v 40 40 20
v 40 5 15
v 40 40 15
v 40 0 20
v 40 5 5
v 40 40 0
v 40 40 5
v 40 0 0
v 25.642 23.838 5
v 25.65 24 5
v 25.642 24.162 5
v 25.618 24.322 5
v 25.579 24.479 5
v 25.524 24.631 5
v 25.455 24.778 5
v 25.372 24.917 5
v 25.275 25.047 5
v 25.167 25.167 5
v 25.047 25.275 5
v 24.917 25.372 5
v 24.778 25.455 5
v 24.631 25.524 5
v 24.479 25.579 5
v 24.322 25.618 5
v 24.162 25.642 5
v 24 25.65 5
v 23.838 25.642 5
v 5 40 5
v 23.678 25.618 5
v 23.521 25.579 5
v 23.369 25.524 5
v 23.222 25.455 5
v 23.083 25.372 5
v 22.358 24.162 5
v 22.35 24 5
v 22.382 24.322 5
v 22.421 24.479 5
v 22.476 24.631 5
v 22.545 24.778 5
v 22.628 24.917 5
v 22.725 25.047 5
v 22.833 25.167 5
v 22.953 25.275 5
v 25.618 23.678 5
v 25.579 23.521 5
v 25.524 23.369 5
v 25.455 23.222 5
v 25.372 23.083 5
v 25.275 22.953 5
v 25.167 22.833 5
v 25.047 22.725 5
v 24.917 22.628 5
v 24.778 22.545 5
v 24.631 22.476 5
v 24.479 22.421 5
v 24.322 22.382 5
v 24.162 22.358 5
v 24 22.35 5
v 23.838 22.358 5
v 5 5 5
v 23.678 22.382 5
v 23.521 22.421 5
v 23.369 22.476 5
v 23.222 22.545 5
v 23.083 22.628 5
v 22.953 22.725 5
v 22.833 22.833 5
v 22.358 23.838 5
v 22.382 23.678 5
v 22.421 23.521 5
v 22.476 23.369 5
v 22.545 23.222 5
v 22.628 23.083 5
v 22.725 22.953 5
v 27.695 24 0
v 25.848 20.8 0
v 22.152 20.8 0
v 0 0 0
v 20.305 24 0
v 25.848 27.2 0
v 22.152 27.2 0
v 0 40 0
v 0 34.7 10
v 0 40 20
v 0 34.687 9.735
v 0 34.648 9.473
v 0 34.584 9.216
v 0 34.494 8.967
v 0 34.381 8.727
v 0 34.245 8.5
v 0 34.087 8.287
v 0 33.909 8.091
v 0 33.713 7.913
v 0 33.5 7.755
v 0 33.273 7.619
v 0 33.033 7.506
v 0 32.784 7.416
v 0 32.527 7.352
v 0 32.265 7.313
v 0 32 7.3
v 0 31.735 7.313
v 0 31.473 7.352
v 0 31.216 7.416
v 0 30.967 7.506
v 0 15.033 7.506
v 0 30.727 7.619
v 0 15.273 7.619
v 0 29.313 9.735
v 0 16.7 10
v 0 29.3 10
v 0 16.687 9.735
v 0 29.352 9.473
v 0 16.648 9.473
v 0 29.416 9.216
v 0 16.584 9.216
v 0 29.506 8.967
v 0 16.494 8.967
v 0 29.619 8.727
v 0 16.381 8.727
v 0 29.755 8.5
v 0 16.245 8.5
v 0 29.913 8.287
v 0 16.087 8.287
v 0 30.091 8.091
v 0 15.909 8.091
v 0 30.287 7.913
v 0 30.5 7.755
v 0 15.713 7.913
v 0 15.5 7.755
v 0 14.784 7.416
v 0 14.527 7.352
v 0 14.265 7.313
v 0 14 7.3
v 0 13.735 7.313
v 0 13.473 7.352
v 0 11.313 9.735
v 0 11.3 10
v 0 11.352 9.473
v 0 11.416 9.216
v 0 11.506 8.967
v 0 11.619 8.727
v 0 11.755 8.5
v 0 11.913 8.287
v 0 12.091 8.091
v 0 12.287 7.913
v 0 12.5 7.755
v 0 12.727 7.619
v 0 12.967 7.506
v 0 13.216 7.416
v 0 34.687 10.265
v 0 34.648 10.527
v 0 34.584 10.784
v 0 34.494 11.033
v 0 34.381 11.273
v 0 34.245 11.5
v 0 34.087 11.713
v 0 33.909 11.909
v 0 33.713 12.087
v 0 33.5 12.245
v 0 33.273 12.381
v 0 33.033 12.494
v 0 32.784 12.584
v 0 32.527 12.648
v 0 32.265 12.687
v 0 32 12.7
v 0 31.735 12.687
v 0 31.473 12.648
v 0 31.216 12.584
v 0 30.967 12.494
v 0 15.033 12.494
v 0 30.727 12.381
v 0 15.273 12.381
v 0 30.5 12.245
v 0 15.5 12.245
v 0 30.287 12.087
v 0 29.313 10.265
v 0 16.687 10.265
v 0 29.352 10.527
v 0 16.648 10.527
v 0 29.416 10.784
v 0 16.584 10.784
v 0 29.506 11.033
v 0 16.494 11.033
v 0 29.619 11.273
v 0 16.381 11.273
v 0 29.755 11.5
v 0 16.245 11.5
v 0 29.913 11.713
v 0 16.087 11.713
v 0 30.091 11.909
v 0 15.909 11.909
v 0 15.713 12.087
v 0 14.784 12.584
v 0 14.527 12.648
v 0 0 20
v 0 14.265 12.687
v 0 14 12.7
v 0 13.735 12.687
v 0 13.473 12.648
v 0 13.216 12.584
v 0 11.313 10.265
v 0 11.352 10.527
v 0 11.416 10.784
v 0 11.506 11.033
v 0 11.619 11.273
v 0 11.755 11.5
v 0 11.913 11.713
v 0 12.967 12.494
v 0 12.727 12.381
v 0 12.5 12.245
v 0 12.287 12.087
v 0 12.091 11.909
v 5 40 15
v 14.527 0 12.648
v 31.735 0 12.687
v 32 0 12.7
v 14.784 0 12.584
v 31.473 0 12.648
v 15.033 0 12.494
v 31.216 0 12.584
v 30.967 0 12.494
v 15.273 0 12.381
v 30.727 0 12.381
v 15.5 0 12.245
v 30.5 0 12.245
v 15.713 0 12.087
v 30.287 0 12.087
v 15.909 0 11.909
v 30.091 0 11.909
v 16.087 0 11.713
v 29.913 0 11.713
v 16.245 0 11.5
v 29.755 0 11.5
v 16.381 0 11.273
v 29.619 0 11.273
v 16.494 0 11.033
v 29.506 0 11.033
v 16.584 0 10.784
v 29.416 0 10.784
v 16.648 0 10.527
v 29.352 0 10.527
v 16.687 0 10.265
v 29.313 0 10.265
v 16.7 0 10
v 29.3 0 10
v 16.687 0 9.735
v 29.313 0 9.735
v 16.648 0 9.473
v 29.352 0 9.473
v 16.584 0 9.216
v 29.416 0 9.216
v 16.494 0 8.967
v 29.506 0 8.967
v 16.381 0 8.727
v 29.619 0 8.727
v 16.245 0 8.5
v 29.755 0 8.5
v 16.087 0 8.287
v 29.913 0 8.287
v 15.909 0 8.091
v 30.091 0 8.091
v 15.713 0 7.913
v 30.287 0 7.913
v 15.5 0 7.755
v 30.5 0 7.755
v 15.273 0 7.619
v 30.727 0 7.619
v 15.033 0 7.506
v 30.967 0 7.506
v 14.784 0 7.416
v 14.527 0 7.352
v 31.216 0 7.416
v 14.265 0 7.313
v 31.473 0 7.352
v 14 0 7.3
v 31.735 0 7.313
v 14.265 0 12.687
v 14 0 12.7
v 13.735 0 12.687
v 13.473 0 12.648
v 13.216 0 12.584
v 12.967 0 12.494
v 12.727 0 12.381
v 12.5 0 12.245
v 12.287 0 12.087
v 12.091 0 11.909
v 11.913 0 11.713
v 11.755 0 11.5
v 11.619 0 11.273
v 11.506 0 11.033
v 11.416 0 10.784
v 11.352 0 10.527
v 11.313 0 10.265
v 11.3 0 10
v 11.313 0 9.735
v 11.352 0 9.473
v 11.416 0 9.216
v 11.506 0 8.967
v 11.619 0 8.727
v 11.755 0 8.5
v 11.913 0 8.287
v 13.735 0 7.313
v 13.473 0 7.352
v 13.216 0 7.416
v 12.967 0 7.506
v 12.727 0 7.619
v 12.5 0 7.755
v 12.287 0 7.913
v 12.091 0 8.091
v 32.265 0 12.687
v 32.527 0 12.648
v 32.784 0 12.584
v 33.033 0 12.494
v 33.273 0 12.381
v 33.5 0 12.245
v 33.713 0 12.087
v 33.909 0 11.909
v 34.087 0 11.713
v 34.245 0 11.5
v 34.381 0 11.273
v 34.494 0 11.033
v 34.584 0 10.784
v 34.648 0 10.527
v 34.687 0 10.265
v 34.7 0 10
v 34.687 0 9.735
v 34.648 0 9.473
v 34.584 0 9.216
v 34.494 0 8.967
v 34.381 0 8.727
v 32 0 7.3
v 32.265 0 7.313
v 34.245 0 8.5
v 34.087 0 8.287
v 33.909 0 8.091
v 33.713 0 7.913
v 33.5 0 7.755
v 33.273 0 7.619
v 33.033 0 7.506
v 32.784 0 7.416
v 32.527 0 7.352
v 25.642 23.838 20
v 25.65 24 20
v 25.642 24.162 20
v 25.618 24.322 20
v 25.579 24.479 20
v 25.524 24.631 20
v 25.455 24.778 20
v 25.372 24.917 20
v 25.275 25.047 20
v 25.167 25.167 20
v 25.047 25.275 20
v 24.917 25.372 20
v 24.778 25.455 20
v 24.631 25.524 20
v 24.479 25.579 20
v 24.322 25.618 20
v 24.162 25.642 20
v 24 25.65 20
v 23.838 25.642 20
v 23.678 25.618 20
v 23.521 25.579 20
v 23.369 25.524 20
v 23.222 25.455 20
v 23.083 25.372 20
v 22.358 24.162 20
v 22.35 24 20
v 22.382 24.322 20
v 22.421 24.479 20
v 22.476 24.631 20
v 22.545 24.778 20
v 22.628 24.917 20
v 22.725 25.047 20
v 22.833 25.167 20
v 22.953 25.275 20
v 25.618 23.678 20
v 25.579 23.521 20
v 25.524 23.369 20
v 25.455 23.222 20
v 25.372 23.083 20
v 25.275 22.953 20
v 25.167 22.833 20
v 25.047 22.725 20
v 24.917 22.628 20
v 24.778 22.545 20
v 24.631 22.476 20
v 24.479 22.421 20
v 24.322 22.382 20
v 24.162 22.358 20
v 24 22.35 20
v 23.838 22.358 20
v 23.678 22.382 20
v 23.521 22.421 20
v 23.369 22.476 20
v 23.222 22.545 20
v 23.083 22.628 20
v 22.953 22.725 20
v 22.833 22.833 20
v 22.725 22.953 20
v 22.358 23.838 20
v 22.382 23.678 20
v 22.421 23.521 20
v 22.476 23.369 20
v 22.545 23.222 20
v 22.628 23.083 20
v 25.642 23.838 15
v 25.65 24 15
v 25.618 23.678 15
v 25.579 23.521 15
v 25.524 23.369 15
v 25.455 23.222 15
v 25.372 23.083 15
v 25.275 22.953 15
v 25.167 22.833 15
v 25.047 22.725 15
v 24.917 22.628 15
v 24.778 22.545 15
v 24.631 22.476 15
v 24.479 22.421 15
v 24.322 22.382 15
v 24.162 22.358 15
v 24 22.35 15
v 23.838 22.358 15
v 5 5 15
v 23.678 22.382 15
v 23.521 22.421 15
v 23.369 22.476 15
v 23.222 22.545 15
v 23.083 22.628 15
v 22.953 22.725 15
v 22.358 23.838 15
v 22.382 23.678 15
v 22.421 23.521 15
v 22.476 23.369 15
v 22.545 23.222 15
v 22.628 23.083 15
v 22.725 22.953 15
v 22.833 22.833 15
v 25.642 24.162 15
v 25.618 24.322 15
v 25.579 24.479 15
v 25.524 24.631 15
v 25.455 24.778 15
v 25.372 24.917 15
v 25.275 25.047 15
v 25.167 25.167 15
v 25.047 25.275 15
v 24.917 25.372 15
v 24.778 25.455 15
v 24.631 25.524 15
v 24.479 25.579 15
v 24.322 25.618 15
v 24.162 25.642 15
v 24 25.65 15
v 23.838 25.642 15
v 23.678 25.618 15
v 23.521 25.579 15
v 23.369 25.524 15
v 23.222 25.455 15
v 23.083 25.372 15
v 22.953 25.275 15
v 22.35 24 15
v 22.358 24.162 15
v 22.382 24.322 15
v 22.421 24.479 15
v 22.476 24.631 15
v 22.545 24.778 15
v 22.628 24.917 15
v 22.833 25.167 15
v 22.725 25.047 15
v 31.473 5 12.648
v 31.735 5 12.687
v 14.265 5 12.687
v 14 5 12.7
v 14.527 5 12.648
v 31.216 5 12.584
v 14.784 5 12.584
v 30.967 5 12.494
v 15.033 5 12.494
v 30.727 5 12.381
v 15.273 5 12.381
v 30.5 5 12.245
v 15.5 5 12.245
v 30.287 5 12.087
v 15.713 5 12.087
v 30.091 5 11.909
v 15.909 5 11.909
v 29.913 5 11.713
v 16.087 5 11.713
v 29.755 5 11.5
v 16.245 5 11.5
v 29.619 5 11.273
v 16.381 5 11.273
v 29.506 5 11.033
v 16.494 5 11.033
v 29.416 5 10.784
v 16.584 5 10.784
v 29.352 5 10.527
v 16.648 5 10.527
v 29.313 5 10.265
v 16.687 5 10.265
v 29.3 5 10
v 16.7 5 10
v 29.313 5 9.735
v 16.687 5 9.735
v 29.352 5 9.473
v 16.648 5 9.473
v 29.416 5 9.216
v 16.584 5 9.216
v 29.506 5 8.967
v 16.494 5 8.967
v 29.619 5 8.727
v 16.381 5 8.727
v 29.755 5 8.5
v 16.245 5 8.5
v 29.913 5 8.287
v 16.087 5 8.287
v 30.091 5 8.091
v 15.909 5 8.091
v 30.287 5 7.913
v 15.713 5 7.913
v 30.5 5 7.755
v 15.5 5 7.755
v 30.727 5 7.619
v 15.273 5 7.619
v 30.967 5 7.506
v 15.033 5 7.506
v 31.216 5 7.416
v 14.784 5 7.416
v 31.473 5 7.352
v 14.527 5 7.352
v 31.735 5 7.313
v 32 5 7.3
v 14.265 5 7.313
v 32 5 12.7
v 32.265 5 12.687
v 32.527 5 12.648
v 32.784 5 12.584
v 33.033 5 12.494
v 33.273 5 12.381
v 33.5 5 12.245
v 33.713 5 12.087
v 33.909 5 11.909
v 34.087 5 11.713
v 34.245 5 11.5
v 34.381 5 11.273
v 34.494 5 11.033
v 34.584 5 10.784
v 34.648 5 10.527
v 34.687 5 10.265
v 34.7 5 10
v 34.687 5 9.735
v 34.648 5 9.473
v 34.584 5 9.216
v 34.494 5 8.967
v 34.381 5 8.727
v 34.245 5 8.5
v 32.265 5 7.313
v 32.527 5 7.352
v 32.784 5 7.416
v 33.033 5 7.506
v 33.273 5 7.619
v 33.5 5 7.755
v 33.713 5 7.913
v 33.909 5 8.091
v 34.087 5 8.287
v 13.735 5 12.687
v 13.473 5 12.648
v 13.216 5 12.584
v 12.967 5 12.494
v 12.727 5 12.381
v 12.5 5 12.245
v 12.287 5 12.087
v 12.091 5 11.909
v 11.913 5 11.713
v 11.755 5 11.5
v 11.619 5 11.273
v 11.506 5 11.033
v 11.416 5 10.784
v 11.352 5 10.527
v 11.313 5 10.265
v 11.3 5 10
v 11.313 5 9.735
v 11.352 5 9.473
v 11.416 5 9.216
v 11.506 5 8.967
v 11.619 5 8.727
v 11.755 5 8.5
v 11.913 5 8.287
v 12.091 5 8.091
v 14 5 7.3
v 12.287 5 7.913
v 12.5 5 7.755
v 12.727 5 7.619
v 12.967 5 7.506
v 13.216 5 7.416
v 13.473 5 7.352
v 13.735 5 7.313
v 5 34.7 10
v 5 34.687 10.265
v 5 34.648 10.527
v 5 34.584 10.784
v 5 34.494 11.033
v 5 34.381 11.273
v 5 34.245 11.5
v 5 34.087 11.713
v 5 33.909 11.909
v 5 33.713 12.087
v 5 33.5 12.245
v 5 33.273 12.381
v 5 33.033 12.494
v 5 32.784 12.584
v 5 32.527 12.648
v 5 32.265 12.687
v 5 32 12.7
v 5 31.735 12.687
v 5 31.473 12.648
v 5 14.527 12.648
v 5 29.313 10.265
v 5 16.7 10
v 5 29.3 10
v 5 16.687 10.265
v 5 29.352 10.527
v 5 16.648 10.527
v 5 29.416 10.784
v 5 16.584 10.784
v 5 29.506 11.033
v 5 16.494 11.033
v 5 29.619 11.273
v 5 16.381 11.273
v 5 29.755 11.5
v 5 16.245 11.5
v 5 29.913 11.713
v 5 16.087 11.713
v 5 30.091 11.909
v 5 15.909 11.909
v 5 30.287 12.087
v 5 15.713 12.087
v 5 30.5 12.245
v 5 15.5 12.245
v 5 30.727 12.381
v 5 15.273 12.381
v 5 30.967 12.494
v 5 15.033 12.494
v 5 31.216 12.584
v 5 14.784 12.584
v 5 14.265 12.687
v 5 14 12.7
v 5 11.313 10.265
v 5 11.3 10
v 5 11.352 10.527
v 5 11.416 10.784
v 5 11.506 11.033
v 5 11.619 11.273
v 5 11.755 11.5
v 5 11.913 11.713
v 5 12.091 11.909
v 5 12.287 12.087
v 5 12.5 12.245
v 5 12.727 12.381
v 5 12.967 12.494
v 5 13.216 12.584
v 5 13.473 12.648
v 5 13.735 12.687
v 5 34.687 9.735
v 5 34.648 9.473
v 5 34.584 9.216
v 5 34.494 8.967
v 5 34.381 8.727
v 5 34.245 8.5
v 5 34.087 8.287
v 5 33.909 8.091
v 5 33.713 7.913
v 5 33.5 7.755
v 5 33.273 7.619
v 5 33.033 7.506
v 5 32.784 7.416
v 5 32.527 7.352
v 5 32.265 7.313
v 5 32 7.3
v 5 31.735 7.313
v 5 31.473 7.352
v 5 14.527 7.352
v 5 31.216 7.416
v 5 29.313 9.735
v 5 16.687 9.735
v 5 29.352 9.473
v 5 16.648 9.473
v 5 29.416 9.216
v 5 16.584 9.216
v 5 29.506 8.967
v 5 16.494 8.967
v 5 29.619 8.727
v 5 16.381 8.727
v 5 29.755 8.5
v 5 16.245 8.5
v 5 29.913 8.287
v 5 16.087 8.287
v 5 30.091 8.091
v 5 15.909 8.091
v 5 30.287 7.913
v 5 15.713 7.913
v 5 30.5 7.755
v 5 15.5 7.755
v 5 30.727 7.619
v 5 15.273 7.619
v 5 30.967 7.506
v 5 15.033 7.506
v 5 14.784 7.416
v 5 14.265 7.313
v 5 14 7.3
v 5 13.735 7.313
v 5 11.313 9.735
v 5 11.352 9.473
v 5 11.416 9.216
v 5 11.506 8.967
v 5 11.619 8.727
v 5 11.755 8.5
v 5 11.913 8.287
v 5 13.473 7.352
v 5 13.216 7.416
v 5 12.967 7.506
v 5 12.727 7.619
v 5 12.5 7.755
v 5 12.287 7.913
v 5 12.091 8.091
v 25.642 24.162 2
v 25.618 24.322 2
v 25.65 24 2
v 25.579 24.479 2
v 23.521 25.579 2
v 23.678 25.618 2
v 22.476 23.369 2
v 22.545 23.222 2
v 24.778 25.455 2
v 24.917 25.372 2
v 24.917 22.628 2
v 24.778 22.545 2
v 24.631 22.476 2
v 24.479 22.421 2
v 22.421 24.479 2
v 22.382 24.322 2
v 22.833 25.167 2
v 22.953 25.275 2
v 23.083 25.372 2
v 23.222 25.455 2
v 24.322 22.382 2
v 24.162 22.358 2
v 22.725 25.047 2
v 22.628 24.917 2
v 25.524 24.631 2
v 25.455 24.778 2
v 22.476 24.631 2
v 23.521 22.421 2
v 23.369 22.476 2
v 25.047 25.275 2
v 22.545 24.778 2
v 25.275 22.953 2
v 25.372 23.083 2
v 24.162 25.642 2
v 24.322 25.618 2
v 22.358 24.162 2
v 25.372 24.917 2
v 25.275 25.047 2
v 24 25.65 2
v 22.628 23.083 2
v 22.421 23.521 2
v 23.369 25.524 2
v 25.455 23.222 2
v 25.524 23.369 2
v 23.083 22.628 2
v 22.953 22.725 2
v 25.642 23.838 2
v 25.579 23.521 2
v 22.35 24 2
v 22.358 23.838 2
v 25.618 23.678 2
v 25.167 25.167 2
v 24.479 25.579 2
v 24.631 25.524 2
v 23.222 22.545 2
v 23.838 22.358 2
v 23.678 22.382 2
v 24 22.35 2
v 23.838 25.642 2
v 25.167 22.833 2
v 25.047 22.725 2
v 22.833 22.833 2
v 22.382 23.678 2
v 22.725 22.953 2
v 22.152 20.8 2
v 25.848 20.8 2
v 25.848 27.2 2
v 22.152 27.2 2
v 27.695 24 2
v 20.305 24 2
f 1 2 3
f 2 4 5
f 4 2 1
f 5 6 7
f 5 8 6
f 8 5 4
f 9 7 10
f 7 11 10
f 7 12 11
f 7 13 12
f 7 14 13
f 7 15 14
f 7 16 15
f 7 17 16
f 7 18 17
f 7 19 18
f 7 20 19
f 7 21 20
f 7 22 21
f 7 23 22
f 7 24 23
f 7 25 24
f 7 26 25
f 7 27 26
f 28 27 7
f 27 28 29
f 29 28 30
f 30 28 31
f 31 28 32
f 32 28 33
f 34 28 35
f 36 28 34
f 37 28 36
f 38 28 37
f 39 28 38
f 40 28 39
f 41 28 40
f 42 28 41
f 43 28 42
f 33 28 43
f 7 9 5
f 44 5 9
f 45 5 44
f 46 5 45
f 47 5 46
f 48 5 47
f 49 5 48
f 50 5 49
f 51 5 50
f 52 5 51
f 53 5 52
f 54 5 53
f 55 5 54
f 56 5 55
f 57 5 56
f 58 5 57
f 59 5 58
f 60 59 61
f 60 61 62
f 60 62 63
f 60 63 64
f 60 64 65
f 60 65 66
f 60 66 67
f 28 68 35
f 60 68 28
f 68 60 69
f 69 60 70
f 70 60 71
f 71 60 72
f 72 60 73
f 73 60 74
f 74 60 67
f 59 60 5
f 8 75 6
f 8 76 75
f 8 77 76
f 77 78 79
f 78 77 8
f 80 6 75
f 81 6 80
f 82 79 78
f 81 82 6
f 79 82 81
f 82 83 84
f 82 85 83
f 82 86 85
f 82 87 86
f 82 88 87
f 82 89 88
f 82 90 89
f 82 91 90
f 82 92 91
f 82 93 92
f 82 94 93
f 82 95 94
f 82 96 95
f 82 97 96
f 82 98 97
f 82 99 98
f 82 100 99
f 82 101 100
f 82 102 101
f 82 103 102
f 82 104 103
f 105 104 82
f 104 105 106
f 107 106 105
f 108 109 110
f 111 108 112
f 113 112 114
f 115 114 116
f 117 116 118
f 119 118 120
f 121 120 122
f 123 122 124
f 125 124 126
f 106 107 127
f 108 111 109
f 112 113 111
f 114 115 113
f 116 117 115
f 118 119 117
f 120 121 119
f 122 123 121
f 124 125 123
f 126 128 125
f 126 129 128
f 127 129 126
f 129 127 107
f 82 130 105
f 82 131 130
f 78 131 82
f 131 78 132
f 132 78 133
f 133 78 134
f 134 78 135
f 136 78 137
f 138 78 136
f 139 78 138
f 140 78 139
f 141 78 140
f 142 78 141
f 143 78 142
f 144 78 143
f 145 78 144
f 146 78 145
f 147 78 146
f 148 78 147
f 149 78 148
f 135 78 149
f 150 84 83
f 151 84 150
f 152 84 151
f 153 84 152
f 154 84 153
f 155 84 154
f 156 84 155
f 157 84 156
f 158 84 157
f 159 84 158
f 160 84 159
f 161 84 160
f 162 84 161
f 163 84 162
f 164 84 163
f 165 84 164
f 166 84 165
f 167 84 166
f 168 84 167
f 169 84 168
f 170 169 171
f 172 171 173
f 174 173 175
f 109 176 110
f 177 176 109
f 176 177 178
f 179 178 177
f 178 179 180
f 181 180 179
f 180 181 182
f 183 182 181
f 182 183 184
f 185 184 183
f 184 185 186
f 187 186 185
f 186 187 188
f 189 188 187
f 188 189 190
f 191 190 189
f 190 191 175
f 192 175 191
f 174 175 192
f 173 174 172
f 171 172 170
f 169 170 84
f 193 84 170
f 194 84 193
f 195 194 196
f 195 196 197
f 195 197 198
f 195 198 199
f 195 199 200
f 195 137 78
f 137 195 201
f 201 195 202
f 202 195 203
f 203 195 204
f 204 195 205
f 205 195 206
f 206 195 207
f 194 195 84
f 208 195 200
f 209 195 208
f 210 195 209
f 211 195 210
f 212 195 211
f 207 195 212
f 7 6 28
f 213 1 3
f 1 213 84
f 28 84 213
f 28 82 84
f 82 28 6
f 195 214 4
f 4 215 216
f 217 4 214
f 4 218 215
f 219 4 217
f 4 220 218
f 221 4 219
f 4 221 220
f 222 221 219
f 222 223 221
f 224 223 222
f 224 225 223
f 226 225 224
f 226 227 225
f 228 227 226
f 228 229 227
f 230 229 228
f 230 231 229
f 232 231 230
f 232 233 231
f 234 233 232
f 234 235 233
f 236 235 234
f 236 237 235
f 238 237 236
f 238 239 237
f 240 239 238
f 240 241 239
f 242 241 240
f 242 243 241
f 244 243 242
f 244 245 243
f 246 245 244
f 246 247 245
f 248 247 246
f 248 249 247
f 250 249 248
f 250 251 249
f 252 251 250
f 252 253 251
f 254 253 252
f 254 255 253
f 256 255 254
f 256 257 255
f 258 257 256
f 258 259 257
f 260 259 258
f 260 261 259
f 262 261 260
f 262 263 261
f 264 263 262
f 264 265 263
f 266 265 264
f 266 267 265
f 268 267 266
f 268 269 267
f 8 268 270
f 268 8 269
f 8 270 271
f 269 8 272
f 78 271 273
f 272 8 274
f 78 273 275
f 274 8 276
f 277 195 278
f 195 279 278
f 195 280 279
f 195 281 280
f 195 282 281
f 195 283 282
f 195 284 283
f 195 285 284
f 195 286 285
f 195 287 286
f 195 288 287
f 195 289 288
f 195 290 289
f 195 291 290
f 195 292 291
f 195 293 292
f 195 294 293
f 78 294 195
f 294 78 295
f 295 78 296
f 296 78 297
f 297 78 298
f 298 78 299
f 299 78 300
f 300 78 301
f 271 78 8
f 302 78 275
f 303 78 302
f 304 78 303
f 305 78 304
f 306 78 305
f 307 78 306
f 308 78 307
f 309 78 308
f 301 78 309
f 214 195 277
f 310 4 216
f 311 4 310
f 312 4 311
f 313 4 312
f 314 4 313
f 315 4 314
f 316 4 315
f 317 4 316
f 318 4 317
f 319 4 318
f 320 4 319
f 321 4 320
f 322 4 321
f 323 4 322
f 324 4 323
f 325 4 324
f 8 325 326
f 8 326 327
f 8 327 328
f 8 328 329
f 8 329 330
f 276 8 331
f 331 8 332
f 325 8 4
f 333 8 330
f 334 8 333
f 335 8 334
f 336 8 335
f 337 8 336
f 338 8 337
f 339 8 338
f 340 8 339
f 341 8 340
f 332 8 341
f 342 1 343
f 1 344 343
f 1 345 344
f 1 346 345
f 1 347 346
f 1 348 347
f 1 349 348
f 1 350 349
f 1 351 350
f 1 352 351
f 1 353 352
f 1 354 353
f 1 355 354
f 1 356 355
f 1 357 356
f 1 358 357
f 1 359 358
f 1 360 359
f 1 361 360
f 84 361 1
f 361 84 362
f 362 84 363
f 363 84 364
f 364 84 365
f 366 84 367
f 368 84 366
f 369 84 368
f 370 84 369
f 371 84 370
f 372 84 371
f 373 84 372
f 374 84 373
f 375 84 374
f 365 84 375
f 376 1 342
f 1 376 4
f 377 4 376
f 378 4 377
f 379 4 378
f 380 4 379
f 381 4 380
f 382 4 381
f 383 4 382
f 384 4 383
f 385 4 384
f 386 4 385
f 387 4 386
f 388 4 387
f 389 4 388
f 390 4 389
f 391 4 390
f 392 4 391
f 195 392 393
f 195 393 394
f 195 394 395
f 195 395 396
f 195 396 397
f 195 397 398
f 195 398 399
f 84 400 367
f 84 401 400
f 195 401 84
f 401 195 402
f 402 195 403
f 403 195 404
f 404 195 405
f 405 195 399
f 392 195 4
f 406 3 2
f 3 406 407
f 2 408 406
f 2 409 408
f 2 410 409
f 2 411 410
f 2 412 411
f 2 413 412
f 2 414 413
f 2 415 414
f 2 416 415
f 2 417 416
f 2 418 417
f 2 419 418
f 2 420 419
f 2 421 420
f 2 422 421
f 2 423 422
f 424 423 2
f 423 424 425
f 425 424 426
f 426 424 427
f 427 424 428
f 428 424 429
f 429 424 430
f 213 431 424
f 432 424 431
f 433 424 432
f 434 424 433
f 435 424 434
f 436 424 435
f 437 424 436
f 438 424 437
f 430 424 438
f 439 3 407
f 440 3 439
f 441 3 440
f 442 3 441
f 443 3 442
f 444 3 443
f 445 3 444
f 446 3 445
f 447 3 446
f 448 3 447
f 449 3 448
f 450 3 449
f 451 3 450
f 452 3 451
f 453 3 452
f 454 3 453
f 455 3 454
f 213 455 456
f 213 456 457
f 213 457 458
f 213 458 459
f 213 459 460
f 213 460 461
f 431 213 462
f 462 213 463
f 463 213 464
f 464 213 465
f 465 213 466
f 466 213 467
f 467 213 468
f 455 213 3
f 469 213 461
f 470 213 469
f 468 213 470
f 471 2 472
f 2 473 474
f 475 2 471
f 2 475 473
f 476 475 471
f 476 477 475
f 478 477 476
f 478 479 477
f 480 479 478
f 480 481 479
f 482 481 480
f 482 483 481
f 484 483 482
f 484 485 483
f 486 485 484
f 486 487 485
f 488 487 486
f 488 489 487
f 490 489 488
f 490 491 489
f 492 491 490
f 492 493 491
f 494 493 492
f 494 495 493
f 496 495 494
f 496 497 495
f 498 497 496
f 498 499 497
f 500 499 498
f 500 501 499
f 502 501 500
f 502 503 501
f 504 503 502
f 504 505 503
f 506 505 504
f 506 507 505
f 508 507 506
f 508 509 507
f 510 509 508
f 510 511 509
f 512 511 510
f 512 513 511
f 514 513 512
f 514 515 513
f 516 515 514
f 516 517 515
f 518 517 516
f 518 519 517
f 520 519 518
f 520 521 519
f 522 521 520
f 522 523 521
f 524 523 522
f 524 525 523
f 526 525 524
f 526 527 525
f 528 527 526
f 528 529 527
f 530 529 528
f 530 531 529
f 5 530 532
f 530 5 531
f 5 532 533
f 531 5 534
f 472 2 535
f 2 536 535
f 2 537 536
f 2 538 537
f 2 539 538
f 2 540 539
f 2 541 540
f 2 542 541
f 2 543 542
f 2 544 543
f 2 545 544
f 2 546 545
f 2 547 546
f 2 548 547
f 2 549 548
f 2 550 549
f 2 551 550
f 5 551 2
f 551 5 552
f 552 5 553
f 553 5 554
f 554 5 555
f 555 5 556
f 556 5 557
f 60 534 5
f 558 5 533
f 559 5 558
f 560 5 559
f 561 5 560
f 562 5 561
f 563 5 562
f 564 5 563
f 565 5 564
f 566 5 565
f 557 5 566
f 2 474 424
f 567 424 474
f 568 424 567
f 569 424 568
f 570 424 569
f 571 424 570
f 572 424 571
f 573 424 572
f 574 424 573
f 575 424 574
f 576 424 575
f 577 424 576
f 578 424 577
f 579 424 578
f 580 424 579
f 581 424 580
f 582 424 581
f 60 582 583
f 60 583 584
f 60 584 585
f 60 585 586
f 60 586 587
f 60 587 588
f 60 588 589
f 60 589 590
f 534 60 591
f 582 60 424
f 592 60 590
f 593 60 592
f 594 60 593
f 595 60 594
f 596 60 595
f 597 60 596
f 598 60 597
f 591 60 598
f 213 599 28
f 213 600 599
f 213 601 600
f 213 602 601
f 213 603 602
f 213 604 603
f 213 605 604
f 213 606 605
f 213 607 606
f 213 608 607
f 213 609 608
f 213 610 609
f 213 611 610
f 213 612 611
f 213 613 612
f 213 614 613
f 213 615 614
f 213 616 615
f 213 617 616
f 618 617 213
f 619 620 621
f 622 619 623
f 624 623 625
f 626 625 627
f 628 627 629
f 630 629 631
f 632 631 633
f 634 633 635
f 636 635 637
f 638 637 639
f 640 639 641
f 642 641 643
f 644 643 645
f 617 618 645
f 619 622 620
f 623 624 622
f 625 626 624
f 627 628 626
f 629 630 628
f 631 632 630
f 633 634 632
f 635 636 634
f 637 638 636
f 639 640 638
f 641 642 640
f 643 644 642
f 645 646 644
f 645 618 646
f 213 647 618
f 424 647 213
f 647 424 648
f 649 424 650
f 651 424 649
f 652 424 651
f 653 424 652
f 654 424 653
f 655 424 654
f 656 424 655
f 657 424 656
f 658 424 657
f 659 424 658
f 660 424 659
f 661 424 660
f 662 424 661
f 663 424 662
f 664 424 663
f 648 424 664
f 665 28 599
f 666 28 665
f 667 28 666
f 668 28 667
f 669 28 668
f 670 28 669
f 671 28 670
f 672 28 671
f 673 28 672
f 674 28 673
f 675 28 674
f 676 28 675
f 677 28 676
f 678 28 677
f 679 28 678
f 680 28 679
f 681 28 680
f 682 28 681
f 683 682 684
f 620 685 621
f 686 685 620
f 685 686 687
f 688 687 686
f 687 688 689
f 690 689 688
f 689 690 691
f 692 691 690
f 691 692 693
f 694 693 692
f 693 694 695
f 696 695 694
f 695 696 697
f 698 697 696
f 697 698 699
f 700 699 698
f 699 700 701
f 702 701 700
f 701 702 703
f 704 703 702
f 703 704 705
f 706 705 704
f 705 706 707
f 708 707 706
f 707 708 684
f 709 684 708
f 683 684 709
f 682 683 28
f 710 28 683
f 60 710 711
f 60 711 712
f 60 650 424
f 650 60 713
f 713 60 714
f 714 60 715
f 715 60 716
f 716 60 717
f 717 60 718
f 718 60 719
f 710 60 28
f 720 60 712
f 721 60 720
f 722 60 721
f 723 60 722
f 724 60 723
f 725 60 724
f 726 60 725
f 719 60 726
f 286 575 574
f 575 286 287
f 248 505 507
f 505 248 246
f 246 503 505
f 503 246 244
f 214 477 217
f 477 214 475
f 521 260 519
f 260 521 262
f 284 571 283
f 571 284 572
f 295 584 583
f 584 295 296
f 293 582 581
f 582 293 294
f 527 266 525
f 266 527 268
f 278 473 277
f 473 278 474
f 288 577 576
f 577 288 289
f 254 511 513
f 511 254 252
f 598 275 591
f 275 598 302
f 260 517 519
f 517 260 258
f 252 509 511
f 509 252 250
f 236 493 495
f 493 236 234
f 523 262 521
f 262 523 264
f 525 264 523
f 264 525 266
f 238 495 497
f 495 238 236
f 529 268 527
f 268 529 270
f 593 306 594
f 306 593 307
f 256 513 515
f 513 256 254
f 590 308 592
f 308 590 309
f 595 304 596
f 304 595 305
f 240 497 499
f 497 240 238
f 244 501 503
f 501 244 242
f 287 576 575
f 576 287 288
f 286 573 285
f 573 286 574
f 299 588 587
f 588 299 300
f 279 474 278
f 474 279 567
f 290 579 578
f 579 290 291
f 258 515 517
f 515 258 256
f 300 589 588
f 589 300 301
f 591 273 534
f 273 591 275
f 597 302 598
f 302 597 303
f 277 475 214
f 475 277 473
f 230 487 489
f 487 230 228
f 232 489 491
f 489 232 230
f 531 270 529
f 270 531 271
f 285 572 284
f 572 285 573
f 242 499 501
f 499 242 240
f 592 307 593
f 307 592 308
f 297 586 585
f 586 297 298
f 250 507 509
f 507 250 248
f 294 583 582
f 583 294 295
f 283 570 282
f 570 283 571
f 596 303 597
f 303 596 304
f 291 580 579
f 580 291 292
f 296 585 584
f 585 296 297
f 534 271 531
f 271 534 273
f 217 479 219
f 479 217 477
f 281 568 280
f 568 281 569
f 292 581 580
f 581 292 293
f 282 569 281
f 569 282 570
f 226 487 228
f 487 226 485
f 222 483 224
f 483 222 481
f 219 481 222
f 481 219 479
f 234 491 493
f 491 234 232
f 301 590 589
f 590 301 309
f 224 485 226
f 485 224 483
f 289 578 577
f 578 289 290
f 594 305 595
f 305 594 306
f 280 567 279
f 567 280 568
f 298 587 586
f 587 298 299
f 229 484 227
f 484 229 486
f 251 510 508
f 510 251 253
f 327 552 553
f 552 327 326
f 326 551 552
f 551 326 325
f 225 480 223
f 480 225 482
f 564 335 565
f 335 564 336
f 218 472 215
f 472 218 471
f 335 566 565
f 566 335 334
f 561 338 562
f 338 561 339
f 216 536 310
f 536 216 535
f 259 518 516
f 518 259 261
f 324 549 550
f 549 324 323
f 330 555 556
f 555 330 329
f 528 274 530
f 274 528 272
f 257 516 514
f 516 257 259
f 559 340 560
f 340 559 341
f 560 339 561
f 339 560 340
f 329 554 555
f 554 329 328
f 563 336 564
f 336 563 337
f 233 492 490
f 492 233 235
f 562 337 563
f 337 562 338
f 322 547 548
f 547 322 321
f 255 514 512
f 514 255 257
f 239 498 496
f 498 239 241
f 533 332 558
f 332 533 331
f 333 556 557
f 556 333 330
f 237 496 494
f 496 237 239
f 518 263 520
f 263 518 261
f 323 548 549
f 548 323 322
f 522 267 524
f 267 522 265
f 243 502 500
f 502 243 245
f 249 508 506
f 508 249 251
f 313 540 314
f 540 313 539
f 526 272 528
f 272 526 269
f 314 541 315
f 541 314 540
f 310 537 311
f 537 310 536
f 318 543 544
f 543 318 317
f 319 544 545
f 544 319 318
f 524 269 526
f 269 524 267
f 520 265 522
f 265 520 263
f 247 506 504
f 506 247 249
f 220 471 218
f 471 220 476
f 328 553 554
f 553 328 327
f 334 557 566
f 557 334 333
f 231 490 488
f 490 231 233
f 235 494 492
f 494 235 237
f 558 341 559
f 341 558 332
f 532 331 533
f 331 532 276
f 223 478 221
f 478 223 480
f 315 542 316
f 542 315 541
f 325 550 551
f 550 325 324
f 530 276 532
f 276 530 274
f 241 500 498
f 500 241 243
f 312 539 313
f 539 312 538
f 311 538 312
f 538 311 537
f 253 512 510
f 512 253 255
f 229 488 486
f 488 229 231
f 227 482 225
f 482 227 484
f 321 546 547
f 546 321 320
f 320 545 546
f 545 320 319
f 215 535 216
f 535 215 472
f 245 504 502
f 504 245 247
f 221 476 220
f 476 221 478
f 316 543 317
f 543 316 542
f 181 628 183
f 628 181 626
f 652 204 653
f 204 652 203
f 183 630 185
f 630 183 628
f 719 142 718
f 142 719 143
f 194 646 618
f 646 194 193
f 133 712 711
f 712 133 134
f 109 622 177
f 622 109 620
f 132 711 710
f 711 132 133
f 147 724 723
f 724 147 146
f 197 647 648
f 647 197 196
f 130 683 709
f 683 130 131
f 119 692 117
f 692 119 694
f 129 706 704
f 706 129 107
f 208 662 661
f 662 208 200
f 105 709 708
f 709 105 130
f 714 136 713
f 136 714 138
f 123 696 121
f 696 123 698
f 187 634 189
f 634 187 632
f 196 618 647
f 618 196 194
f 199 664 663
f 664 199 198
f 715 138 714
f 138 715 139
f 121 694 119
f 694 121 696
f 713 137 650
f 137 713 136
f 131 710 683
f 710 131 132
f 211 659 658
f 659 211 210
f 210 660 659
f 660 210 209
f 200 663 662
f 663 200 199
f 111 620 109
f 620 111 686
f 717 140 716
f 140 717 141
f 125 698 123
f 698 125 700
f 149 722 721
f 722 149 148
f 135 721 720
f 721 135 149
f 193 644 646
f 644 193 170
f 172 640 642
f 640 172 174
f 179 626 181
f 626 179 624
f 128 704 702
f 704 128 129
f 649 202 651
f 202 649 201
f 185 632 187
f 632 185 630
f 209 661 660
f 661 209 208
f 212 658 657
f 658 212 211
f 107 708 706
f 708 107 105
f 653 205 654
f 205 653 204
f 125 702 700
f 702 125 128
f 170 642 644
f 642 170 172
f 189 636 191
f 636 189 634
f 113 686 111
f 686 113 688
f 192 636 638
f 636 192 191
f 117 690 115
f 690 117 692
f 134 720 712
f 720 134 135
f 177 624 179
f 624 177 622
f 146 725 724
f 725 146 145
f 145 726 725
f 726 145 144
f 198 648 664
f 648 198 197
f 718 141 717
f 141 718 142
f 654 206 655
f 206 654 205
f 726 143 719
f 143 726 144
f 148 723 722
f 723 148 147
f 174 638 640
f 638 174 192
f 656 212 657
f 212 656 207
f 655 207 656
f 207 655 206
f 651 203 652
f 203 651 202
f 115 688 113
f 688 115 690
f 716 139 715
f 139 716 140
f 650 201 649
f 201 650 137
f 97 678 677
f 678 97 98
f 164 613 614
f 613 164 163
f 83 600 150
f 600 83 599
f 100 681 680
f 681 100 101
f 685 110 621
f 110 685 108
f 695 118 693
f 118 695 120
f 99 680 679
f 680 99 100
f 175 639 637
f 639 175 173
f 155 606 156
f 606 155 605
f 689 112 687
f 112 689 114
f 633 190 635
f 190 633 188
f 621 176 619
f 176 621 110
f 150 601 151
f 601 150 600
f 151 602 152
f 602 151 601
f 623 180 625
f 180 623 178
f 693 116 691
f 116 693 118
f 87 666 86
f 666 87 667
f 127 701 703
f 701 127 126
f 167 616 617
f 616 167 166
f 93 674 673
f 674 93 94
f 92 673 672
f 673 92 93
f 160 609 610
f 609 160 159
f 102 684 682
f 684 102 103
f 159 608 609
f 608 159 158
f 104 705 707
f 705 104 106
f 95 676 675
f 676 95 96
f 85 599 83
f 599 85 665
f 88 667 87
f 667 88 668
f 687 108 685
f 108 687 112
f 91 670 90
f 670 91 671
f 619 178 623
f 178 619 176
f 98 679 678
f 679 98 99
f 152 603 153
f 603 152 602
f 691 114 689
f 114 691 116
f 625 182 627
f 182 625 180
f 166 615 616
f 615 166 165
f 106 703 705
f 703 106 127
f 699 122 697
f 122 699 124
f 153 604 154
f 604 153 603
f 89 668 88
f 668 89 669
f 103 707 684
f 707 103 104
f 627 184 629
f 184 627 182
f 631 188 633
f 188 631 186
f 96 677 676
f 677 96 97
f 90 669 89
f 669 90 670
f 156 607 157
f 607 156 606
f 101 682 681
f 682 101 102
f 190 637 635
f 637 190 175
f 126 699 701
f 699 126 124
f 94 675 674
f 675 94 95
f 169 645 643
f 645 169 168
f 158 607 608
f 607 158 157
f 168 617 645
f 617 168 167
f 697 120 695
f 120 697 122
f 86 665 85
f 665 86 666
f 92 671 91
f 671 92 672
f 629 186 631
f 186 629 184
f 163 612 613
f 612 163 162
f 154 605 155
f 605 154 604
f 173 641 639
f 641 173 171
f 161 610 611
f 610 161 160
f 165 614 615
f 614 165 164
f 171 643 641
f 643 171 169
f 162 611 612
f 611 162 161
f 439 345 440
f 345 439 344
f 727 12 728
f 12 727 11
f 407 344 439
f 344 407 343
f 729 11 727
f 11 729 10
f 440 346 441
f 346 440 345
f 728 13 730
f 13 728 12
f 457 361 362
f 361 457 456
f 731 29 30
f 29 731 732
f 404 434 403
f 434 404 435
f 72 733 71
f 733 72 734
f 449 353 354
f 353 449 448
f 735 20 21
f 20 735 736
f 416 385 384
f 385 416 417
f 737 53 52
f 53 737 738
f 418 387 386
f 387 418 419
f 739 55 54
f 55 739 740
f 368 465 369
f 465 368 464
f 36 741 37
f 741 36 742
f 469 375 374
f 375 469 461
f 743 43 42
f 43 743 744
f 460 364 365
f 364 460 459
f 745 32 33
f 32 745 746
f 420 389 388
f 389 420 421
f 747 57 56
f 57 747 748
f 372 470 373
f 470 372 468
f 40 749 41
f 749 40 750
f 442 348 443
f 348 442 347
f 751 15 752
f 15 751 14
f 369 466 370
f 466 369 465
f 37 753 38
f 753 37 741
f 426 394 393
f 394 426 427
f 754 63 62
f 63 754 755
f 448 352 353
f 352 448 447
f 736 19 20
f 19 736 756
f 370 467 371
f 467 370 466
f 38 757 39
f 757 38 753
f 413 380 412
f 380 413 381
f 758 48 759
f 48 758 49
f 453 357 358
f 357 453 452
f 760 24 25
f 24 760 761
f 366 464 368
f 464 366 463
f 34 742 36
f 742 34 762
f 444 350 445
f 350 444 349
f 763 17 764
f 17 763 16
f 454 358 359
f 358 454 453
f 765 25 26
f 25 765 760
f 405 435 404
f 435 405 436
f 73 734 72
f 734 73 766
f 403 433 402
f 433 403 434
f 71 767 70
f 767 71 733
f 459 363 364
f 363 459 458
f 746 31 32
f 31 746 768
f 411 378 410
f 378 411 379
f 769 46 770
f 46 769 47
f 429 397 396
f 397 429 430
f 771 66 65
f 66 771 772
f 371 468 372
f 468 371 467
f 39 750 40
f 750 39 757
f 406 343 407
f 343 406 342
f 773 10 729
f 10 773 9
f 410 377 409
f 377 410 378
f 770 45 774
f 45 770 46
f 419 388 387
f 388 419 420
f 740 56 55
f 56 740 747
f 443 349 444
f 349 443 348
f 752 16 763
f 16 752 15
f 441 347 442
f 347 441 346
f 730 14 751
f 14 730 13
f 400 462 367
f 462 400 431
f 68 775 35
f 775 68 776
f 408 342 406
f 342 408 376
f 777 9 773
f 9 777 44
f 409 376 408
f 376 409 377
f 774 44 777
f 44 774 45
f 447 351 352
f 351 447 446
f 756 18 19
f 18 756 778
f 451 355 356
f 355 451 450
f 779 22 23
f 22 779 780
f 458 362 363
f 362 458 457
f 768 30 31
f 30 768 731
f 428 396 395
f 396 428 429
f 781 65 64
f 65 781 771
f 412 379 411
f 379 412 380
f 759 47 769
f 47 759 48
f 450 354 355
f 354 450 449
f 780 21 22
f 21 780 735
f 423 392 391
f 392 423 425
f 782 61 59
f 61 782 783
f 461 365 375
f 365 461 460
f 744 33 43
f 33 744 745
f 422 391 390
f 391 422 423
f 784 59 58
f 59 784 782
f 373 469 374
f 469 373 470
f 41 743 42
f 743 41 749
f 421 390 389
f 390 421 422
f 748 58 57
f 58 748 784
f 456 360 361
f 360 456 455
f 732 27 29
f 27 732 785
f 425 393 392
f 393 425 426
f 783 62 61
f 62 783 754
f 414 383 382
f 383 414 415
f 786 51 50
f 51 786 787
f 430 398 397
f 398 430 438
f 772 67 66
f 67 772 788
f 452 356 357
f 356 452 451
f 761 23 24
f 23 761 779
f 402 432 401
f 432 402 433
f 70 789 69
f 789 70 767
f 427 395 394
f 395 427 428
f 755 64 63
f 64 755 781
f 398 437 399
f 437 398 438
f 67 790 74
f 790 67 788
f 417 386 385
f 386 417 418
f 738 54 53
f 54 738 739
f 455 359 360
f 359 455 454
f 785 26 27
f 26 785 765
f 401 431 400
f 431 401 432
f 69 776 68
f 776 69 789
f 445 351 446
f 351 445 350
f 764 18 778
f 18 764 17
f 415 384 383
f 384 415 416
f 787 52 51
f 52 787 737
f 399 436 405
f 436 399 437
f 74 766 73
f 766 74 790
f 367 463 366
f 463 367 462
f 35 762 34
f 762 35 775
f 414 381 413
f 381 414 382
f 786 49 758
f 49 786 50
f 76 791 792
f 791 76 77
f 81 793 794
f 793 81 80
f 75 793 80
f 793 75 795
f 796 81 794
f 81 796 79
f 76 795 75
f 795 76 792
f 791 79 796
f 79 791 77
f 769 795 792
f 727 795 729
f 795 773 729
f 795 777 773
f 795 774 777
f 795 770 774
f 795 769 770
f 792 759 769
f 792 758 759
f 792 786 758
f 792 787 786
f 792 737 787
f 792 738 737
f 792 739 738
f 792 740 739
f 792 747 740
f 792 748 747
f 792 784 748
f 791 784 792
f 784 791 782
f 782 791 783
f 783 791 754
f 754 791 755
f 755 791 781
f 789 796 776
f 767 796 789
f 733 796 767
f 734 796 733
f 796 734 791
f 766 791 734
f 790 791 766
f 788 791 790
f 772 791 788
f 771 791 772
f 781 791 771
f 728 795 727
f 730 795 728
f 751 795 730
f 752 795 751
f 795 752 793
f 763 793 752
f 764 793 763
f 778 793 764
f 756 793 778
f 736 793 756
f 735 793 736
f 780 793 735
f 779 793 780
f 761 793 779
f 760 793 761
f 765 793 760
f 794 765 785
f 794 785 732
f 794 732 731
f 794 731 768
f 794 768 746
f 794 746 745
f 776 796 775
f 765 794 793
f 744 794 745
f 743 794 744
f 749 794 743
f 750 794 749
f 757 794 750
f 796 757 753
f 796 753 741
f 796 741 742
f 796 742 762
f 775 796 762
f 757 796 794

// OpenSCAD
// file: common.scad
// OpenRook: shared dimensions for every printed part. Change a number here and re-run
// ../render.sh. Keep SQUARE in step with DEFAULT_SQUARE_MM in firmware/OpenRook/config.h.

$fn = 64;

// ---------------------------------------------------------------- board
SQUARE = 40;            // square pitch (mm)
TILE_SQUARES = 4;       // a playing tile is 4x4 squares; four tiles make the board
TILE_T = 3.4;           // tile thickness
INLAY_D = 0.6;          // dark-square recess depth for a second colour (0 = flat tile)
REED_L = 15;            // reed switch glass length (2x14 mm glass + margin)
REED_W = 2.6;           // groove width for glass body
GROOVE_D = 2.2;         // depth of wire/switch grooves on the tile underside
WIRE_W = 1.6;           // groove width for legs and wires
DIODE_L = 4.5;          // 1N4148 body (DO-35)
DIODE_W = 2.2;

// ---------------------------------------------------------------- pieces
PIECE_BASE = 20;        // base diameter: must stay <= SQUARE/2 so pieces pass between others
PIECE_MAG_D = 10.3;     // pocket for a 10x3 mm N52 disc magnet (+ clearance)
PIECE_MAG_H = 3.2;
FELT = 0;               // stick 0.5-1 mm felt under each piece; no geometry needed

// ---------------------------------------------------------------- hardware
EXTRUSION = 20;         // 2020 aluminium profile
M5 = 5.4;               // M5 clearance
M3 = 3.3;               // M3 clearance
M3_NUT = 6.4;           // across flats + clearance
ROD = 8;                // smooth rods
ROD_FIT = 8.15;
LM8UU_D = 15.2;
LM8UU_L = 24;
F623_D = 10.4;          // F623ZZ flanged bearing: 10 mm OD, 4 mm wide, 11.5 mm flange
F623_W = 4;
F623_FLANGE = 11.6;
NEMA = 42.3;
NEMA_HOLES = 31;
NEMA_BOSS = 22.5;
BELT_W = 6;             // GT2 6 mm
SERVO_W = 12.6;         // SG90 / MG90S body
SERVO_L = 23.2;
SERVO_TAB = 32.5;       // tab-to-tab length
CARRIAGE_MAG_D = 15.3;  // 15x4 mm N52 magnet on the lifting arm
CARRIAGE_MAG_H = 4.2;

// ---------------------------------------------------------------- frame
// Inside the frame: magnet travel 425 x 335 mm plus the gantry around it.
FRAME_X = 560;          // outer size of the 2020 rectangle (front/back extrusions)
FRAME_Y = 480;          // outer size (side extrusions are FRAME_Y - 40 long)
ROD_SPACING_X = 40;     // the two X rods, centre to centre

module rounded_box(size, r = 2) {
  hull() for (x = [r, size[0] - r], y = [r, size[1] - r]) translate([x, y, 0]) cylinder(r = r, h = size[2]);
}

module m3_nut_trap(h = 3) { cylinder(d = M3_NUT / cos(30), h = h, $fn = 6); }
// main file
// Front corner idlers for the CoreXY belts (print 2; second one with -D MIRROR=1).
// Two F623 bearings stacked on an M3x25 bolt, one belt above the other (belts run at two
// heights so they cross without touching).
include <common.scad>
MIRROR = 0;
T = 5;
GAP = 2 * F623_W + 2;    // two bearings + washers
module mount() {
  difference() {
    union() {
      cube([40, 40, T]);                        // lower arm
      translate([0, 0, T + GAP]) cube([40, 40, T]);  // upper arm
      cube([40, T, 2 * T + GAP]);
      cube([T, 40, 2 * T + GAP]);
    }
    translate([24, 24, -1]) cylinder(d = M3, h = 2 * T + GAP + 2);
    translate([24, 24, -1]) m3_nut_trap(3);
    for (x = [14, 32]) translate([x, -1, (2 * T + GAP) / 2]) rotate([-90, 0, 0]) cylinder(d = M5, h = T + 2);
    for (y = [14, 32]) translate([-1, y, (2 * T + GAP) / 2]) rotate([0, 90, 0]) cylinder(d = M5, h = T + 2);
  }
}
if (MIRROR == 1) mirror([1, 0, 0]) mount(); else mount();
